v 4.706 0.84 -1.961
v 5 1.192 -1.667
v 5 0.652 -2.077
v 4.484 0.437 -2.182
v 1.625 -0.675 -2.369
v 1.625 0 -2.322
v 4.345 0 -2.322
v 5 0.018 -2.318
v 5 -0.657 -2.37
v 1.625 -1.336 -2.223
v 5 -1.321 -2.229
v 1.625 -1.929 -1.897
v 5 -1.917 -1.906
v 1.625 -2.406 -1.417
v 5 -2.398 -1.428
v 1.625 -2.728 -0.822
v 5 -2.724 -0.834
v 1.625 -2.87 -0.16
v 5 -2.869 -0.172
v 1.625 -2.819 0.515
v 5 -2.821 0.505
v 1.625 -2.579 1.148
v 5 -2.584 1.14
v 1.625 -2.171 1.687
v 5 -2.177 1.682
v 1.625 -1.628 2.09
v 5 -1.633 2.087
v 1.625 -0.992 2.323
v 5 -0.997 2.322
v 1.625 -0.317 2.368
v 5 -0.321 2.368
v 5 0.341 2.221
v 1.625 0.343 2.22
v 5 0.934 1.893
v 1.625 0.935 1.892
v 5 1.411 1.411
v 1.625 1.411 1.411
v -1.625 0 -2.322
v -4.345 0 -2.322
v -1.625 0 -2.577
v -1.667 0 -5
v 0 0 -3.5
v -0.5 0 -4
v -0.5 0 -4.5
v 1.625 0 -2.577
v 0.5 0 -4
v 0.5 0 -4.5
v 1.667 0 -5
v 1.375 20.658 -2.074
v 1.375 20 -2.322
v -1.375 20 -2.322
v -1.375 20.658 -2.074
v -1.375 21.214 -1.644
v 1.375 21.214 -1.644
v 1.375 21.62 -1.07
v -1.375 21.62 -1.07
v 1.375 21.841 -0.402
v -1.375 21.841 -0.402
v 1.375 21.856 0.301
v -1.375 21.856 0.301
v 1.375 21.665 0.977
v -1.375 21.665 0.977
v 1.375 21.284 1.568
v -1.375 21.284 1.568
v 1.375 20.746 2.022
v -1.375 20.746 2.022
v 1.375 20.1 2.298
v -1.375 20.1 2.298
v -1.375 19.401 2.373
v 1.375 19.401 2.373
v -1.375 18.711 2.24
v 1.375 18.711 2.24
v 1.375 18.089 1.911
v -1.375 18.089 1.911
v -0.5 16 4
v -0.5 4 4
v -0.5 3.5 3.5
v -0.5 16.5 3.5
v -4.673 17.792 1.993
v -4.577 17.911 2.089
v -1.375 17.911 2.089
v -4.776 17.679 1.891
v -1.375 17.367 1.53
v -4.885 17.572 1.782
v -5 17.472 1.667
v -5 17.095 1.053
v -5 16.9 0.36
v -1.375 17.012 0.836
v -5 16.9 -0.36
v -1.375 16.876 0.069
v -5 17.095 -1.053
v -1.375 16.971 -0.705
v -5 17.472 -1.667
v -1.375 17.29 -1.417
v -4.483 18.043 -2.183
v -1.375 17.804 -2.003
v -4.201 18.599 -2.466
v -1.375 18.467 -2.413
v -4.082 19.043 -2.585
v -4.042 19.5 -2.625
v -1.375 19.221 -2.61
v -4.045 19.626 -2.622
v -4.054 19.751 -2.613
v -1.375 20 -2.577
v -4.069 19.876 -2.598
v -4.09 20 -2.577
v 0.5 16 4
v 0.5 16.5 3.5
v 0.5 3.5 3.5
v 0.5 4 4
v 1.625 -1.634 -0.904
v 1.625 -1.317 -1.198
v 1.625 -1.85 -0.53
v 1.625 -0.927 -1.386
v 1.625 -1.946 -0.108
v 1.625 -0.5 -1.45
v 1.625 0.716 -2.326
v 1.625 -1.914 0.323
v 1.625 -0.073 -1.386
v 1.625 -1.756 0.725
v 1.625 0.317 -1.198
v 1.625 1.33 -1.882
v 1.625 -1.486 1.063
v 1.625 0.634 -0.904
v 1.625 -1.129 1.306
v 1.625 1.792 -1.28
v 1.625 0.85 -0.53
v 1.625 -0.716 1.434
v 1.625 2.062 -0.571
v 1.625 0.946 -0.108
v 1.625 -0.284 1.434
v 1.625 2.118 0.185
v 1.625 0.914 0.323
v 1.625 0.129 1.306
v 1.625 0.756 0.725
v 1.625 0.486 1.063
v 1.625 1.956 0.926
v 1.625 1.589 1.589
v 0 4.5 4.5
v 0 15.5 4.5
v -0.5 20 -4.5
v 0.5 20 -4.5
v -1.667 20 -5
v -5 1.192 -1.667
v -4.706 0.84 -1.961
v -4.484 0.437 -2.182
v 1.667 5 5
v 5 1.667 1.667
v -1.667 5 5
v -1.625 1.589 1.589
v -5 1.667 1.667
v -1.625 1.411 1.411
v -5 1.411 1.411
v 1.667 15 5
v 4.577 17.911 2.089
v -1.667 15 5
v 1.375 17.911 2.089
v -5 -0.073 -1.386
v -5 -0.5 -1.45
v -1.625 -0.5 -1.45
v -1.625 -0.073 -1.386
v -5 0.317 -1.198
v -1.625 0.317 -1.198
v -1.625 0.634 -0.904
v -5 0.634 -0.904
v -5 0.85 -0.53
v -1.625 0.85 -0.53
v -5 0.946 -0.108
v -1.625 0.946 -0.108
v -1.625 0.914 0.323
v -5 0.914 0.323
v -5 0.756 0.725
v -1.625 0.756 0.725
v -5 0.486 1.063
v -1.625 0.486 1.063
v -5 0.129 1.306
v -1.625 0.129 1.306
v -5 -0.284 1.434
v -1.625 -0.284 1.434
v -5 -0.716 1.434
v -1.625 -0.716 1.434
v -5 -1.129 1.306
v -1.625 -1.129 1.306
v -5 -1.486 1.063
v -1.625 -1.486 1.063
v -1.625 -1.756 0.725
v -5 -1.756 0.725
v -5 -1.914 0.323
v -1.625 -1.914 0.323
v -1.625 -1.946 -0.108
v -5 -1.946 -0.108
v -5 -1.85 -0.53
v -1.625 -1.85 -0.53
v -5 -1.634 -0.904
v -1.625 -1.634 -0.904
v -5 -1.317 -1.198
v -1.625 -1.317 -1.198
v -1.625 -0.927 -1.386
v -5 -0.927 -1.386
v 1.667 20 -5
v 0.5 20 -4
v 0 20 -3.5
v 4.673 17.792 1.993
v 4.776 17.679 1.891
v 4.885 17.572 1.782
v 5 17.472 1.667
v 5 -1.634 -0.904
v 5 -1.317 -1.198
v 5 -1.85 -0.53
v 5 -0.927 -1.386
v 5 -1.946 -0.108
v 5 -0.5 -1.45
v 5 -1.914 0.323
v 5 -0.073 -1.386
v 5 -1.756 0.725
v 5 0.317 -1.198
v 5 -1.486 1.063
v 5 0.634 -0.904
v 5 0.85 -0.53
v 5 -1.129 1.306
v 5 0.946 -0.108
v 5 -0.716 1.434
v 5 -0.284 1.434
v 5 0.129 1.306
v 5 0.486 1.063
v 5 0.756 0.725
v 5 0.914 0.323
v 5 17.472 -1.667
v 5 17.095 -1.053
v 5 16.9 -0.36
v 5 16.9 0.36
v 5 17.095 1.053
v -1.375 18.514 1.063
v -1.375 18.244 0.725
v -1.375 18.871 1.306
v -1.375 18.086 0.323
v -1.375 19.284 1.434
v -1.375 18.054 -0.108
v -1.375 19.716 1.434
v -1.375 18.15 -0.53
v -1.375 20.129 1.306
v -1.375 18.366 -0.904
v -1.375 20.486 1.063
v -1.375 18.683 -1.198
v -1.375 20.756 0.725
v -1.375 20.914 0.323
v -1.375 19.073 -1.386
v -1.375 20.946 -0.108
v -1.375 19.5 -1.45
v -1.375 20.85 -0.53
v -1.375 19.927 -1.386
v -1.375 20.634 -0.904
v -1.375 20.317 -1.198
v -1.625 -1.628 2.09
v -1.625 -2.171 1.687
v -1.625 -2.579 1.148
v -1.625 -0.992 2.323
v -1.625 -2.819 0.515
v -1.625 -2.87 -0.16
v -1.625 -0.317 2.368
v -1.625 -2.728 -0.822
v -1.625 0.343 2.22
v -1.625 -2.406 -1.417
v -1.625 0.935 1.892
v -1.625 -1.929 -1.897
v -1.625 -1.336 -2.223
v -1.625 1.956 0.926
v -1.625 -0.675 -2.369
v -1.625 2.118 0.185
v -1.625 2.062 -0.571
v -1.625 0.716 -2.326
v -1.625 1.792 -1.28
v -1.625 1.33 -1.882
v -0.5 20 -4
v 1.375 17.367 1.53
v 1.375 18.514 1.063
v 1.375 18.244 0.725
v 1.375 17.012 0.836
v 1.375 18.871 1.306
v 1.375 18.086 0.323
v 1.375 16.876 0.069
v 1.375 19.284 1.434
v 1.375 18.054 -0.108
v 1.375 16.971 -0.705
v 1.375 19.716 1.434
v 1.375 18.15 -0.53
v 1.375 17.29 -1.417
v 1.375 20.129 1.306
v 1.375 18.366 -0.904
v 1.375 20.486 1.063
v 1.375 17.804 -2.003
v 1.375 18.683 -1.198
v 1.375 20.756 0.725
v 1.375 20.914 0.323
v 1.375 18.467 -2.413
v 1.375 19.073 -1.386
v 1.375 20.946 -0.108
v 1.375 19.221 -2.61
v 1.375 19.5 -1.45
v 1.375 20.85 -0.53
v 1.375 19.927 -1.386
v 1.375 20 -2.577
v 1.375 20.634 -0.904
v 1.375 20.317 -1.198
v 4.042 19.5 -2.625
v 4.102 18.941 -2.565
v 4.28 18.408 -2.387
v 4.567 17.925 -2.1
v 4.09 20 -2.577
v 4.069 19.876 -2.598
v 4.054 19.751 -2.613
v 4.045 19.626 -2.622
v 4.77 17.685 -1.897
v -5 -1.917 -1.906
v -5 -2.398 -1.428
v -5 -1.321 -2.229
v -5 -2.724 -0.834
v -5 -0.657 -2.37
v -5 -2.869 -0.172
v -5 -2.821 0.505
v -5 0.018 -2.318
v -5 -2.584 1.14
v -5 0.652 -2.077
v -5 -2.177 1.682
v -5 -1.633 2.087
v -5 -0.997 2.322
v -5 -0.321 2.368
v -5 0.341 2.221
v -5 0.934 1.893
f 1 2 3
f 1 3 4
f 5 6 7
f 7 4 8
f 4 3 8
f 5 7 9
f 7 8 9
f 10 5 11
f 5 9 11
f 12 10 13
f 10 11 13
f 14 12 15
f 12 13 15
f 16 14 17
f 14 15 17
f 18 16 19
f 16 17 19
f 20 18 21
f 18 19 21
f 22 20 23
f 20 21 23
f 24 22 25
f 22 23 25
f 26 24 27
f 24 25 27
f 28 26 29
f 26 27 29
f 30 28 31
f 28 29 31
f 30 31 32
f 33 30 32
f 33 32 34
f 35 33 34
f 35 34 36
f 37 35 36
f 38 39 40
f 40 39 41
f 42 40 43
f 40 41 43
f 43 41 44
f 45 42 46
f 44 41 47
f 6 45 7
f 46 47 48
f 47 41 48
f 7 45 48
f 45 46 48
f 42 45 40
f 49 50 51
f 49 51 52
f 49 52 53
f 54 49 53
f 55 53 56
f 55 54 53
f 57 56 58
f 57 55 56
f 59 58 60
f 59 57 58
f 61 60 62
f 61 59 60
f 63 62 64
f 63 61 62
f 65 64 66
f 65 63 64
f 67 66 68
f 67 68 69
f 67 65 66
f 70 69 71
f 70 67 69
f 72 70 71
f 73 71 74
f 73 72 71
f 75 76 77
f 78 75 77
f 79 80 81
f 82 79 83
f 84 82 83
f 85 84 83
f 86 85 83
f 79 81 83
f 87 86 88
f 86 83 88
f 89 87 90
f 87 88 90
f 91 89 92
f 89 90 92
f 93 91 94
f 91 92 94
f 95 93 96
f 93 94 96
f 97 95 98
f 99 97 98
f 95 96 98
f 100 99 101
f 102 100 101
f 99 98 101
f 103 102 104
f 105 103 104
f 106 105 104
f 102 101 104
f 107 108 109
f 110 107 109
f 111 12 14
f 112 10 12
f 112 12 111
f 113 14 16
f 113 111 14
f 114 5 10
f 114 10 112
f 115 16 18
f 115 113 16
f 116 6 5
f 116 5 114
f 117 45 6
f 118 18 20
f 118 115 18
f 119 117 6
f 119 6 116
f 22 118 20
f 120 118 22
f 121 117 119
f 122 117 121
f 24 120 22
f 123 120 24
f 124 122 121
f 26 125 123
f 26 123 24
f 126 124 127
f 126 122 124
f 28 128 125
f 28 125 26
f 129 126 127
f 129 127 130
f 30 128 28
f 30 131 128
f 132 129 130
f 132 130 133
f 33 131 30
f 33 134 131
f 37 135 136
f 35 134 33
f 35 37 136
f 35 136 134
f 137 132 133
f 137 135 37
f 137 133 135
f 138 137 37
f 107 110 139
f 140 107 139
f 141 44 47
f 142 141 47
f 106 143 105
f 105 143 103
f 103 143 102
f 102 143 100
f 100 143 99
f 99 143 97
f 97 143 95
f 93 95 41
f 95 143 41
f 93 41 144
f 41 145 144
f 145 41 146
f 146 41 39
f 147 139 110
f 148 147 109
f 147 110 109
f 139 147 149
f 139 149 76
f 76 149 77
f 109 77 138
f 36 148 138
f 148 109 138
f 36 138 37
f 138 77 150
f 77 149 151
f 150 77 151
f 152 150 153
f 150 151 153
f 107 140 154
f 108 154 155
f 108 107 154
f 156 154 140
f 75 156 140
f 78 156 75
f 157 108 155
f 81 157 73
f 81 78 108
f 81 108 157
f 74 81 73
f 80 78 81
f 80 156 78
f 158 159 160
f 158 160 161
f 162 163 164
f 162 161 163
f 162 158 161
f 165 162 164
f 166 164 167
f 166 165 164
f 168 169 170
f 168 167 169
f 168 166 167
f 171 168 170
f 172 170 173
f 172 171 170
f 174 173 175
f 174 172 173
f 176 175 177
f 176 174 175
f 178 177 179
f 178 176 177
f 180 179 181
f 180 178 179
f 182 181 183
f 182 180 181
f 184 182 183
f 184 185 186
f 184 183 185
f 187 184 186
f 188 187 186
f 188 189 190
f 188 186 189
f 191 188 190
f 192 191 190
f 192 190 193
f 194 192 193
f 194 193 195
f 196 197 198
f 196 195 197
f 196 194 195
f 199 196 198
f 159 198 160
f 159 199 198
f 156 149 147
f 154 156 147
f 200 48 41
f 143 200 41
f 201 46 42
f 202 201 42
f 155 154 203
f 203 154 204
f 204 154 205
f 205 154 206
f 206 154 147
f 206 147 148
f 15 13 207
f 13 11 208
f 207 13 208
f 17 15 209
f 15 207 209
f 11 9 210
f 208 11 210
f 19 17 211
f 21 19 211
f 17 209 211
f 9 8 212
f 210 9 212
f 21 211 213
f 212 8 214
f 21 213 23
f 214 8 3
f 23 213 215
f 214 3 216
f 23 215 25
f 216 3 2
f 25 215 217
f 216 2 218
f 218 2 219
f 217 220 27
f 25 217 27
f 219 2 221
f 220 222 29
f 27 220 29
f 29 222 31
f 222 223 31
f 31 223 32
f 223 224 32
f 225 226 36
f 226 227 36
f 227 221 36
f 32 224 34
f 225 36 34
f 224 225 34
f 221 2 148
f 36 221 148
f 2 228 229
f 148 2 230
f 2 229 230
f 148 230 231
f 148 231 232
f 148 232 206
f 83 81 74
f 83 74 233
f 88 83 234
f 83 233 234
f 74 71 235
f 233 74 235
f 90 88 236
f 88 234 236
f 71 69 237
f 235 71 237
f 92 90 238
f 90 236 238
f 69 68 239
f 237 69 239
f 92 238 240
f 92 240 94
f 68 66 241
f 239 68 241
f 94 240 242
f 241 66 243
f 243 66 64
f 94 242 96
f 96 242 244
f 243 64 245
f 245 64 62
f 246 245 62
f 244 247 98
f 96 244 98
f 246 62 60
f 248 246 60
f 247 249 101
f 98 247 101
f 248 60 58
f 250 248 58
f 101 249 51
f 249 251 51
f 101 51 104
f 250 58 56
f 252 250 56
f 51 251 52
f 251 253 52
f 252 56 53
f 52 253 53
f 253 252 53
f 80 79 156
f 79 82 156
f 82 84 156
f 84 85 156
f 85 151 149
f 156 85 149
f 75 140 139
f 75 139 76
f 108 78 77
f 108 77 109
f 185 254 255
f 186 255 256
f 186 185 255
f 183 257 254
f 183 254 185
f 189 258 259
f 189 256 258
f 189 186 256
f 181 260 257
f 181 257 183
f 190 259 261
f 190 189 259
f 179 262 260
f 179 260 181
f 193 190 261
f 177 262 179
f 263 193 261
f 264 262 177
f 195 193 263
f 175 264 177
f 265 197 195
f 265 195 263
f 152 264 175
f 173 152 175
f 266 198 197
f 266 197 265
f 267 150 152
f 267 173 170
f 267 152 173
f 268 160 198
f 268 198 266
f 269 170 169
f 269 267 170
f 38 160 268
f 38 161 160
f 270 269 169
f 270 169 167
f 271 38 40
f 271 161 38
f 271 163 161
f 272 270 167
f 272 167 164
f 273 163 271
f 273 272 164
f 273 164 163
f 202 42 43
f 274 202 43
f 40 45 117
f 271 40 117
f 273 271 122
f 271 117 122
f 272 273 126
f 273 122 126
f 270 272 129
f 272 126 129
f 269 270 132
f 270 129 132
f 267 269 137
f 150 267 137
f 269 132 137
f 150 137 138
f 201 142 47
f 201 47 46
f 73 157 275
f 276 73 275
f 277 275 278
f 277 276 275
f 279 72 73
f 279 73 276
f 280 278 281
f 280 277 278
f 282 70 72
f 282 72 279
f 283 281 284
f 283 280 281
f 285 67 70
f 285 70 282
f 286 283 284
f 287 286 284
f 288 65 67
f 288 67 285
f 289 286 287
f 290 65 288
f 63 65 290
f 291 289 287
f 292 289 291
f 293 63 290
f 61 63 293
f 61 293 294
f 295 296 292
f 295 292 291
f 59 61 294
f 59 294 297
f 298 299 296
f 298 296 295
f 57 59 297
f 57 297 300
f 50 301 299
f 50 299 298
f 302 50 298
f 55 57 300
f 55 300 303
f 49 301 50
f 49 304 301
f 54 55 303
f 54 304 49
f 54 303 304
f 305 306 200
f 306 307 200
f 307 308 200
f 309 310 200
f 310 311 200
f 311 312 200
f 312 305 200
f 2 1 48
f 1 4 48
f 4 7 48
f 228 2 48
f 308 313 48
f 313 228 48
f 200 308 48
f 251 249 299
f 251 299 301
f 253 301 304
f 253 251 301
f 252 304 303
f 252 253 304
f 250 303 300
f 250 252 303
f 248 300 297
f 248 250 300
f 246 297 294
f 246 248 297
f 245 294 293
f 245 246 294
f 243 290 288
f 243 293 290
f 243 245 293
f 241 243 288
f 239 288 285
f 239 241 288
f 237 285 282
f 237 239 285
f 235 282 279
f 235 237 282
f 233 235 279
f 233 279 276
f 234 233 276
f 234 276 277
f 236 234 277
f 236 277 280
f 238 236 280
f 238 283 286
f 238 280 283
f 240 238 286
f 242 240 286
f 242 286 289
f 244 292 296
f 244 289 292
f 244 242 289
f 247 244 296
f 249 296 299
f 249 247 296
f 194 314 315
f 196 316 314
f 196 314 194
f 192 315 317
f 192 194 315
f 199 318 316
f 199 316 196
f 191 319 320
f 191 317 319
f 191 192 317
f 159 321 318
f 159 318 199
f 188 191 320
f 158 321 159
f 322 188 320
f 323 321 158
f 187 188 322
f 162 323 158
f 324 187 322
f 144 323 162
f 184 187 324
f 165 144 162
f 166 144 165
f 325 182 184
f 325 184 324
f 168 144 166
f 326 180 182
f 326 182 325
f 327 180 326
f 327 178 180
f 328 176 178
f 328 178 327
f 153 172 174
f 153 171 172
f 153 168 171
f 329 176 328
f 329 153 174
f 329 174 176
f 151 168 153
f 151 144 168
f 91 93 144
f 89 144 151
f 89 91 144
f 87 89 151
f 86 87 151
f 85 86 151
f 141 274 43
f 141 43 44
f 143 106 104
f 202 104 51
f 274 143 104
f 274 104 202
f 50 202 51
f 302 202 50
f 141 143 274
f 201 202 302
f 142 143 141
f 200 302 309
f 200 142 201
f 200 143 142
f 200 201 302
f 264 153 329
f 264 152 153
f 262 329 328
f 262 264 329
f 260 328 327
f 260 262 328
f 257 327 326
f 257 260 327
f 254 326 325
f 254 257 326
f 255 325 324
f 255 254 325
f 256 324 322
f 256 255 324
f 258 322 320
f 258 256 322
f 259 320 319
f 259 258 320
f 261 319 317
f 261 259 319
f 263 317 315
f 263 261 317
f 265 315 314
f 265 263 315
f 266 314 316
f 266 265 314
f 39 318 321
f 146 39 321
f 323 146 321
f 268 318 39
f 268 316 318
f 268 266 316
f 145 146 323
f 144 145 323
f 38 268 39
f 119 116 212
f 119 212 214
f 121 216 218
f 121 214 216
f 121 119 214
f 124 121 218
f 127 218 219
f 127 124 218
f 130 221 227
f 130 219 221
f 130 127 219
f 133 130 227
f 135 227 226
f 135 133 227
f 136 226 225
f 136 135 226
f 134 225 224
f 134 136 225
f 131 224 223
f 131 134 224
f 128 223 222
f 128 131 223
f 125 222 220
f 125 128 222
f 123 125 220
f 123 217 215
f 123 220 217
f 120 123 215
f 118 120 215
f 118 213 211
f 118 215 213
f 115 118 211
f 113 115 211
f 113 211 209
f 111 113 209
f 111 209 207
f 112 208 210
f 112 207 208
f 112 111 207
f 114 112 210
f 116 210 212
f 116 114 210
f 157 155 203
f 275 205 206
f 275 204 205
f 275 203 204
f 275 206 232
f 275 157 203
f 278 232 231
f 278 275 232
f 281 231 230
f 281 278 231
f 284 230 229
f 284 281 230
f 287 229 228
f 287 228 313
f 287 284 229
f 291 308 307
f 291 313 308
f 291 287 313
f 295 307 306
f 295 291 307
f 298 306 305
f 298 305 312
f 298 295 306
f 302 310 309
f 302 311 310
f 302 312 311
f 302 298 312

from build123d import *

# Parameters (mm, degrees)
BOSS_EXTRUDE1_DEPTH     = 20
CUT_EXTRUDE1_DEPTH      = 22.213203436
CUT_EXTRUDE1_DEPTH_BACK = 22.213203436
CUT_EXTRUDE2_DEPTH      = 22.213203436
SKETCH4_R               = 2.375
BOSS_EXTRUDE2_DEPTH     = 1.375
SKETCH5_R               = 2.625
CUT_EXTRUDE3_DEPTH      = 24.327156921
SKETCH6_R               = 2.625
CUT_EXTRUDE4_DEPTH      = 1.625
BOSS_EXTRUDE3_REACH     = 25.397
SKETCH7_R               = 2.375
BOSS_EXTRUDE4_START     = -3.375
SKETCH8_R               = 2.375
BOSS_EXTRUDE4_DEPTH     = 3.375
CUT_EXTRUDE5_DEPTH      = 24.327156921
CUT_EXTRUDE5_DEPTH_BACK = 24.327156921
SKETCH10_R              = 1.45
CUT_EXTRUDE6_DEPTH      = 25.566555009
CUT_EXTRUDE6_DEPTH_BACK = 25.566555009
SKETCH11_R              = 1.45


with BuildPart() as part:
    # Sketch1 → Boss-Extrude1 (new body)
    with BuildSketch(Plane(origin=(0, 0, 0), x_dir=(1, 0, 0), z_dir=(0, 1, 0))):
        Polygon((-1.666666667, -5), (1.666666667, -5), (5, -1.666666667), (5, 1.666666667), (1.666666667, 5), (-1.666666667, 5), (-5, 1.666666667), (-5, -1.666666667), align=None)
    extrude(amount=BOSS_EXTRUDE1_DEPTH)

    # Sketch2 → Cut-Extrude1 (cut, two sides: drawn at the far end of the back side and taken through both)
    with BuildSketch(Plane(origin=(0, 0, 0), x_dir=(0, 0, -1), z_dir=(1, 0, 0)).offset(-CUT_EXTRUDE1_DEPTH_BACK)):
        Polygon((0, 20), (-5, 20), (-5, 15), align=None)
        Polygon((0, 0), (-5, 0), (-5, 5), align=None)
    extrude(amount=CUT_EXTRUDE1_DEPTH + CUT_EXTRUDE1_DEPTH_BACK, mode=Mode.SUBTRACT)

    # Sketch3 → Cut-Extrude2 (cut, through all)
    with BuildSketch(Plane(origin=(0, 0, 0), x_dir=(1, 0, 0), z_dir=(0, 1, 0))):
        Polygon((0, -4.5), (-0.5, -4), (-0.5, -3.5), (0.5, -3.5), (0.5, -4), align=None)
        Polygon((0.5, 4.5), (0.5, 4), (0, 3.5), (-0.5, 4), (-0.5, 4.5), align=None)
    extrude(amount=CUT_EXTRUDE2_DEPTH, mode=Mode.SUBTRACT)

    # Sketch4 → Boss-Extrude2 (add, symmetric)
    with BuildSketch(Plane(origin=(0, 0, 0), x_dir=(0, 0, -1), z_dir=(1, 0, 0))):
        with Locations((0, 19.5)):
            Circle(SKETCH4_R)
    extrude(amount=BOSS_EXTRUDE2_DEPTH, both=True)

    # Sketch5 → Cut-Extrude3 (cut, through all)
    with BuildSketch(Plane(origin=(1.375, 0, 0), x_dir=(0, 0, -1), z_dir=(1, 0, 0))):
        with Locations((0, 19.5)):
            Circle(SKETCH5_R)
    cut_extrude3 = extrude(amount=CUT_EXTRUDE3_DEPTH, mode=Mode.SUBTRACT)

    # Mirror1: Cut-Extrude3 across plane
    add(cut_extrude3.mirror(Plane(origin=(0, 0, 0), x_dir=(0, 0, 1), z_dir=(1, 0, 0))), mode=Mode.SUBTRACT)

    # Sketch6 → Cut-Extrude4 (cut, symmetric)
    with BuildSketch(Plane(origin=(0, 0, 0), x_dir=(0, 0, -1), z_dir=(1, 0, 0))):
        with Locations((0, -0.5)):
            Circle(SKETCH6_R)
    extrude(amount=CUT_EXTRUDE4_DEPTH, both=True, mode=Mode.SUBTRACT)

    # Boss-Extrude3: up to this face of the body (flat: up to its plane)
    boss_extrude3_end = Plane(part.part.faces().sort_by_distance((-5, 8.732537251, -0.027810101))[0])
    # Sketch7 → Boss-Extrude3 (add, up to the picked face)
    with BuildSketch(Plane(origin=(-1.625, 0, 0), x_dir=(0, 0, -1), z_dir=(1, 0, 0)), mode=Mode.PRIVATE) as boss_extrude3_sk1:
        with Locations((0, -0.5)):
            Circle(SKETCH7_R)
    boss_extrude3_tool1 = split(extrude(boss_extrude3_sk1.sketch, amount=-BOSS_EXTRUDE3_REACH, mode=Mode.PRIVATE), bisect_by=boss_extrude3_end, keep=Keep.BOTH, mode=Mode.PRIVATE)
    add(boss_extrude3_tool1.solids().sort_by(Axis((-1.625, -0.5, 0), (-1, 0, 0)))[0])

    # Sketch8 → Boss-Extrude4 (add)
    with BuildSketch(Plane.ZY.offset(-1.625).offset(BOSS_EXTRUDE4_START)):
        with Locations((0, -0.5)):
            Circle(SKETCH8_R)
    extrude(amount=BOSS_EXTRUDE4_DEPTH)

    # Sketch10 → Cut-Extrude5 (cut, two sides: drawn at the far end of the back side and taken through both)
    with BuildSketch(Plane(origin=(1.375, 0, 0), x_dir=(0, 0, -1), z_dir=(1, 0, 0)).offset(-CUT_EXTRUDE5_DEPTH_BACK)):
        with Locations((0, 19.5)):
            Circle(SKETCH10_R)
    extrude(amount=CUT_EXTRUDE5_DEPTH + CUT_EXTRUDE5_DEPTH_BACK, mode=Mode.SUBTRACT)

    # Sketch11 → Cut-Extrude6 (cut, two sides: drawn at the far end of the back side and taken through both)
    with BuildSketch(Plane(origin=(5, 0, 0), x_dir=(0, 0, -1), z_dir=(1, 0, 0)).offset(-CUT_EXTRUDE6_DEPTH_BACK)):
        with Locations((0, -0.5)):
            Circle(SKETCH11_R)
    extrude(amount=CUT_EXTRUDE6_DEPTH + CUT_EXTRUDE6_DEPTH_BACK, mode=Mode.SUBTRACT)


solid = part.part
